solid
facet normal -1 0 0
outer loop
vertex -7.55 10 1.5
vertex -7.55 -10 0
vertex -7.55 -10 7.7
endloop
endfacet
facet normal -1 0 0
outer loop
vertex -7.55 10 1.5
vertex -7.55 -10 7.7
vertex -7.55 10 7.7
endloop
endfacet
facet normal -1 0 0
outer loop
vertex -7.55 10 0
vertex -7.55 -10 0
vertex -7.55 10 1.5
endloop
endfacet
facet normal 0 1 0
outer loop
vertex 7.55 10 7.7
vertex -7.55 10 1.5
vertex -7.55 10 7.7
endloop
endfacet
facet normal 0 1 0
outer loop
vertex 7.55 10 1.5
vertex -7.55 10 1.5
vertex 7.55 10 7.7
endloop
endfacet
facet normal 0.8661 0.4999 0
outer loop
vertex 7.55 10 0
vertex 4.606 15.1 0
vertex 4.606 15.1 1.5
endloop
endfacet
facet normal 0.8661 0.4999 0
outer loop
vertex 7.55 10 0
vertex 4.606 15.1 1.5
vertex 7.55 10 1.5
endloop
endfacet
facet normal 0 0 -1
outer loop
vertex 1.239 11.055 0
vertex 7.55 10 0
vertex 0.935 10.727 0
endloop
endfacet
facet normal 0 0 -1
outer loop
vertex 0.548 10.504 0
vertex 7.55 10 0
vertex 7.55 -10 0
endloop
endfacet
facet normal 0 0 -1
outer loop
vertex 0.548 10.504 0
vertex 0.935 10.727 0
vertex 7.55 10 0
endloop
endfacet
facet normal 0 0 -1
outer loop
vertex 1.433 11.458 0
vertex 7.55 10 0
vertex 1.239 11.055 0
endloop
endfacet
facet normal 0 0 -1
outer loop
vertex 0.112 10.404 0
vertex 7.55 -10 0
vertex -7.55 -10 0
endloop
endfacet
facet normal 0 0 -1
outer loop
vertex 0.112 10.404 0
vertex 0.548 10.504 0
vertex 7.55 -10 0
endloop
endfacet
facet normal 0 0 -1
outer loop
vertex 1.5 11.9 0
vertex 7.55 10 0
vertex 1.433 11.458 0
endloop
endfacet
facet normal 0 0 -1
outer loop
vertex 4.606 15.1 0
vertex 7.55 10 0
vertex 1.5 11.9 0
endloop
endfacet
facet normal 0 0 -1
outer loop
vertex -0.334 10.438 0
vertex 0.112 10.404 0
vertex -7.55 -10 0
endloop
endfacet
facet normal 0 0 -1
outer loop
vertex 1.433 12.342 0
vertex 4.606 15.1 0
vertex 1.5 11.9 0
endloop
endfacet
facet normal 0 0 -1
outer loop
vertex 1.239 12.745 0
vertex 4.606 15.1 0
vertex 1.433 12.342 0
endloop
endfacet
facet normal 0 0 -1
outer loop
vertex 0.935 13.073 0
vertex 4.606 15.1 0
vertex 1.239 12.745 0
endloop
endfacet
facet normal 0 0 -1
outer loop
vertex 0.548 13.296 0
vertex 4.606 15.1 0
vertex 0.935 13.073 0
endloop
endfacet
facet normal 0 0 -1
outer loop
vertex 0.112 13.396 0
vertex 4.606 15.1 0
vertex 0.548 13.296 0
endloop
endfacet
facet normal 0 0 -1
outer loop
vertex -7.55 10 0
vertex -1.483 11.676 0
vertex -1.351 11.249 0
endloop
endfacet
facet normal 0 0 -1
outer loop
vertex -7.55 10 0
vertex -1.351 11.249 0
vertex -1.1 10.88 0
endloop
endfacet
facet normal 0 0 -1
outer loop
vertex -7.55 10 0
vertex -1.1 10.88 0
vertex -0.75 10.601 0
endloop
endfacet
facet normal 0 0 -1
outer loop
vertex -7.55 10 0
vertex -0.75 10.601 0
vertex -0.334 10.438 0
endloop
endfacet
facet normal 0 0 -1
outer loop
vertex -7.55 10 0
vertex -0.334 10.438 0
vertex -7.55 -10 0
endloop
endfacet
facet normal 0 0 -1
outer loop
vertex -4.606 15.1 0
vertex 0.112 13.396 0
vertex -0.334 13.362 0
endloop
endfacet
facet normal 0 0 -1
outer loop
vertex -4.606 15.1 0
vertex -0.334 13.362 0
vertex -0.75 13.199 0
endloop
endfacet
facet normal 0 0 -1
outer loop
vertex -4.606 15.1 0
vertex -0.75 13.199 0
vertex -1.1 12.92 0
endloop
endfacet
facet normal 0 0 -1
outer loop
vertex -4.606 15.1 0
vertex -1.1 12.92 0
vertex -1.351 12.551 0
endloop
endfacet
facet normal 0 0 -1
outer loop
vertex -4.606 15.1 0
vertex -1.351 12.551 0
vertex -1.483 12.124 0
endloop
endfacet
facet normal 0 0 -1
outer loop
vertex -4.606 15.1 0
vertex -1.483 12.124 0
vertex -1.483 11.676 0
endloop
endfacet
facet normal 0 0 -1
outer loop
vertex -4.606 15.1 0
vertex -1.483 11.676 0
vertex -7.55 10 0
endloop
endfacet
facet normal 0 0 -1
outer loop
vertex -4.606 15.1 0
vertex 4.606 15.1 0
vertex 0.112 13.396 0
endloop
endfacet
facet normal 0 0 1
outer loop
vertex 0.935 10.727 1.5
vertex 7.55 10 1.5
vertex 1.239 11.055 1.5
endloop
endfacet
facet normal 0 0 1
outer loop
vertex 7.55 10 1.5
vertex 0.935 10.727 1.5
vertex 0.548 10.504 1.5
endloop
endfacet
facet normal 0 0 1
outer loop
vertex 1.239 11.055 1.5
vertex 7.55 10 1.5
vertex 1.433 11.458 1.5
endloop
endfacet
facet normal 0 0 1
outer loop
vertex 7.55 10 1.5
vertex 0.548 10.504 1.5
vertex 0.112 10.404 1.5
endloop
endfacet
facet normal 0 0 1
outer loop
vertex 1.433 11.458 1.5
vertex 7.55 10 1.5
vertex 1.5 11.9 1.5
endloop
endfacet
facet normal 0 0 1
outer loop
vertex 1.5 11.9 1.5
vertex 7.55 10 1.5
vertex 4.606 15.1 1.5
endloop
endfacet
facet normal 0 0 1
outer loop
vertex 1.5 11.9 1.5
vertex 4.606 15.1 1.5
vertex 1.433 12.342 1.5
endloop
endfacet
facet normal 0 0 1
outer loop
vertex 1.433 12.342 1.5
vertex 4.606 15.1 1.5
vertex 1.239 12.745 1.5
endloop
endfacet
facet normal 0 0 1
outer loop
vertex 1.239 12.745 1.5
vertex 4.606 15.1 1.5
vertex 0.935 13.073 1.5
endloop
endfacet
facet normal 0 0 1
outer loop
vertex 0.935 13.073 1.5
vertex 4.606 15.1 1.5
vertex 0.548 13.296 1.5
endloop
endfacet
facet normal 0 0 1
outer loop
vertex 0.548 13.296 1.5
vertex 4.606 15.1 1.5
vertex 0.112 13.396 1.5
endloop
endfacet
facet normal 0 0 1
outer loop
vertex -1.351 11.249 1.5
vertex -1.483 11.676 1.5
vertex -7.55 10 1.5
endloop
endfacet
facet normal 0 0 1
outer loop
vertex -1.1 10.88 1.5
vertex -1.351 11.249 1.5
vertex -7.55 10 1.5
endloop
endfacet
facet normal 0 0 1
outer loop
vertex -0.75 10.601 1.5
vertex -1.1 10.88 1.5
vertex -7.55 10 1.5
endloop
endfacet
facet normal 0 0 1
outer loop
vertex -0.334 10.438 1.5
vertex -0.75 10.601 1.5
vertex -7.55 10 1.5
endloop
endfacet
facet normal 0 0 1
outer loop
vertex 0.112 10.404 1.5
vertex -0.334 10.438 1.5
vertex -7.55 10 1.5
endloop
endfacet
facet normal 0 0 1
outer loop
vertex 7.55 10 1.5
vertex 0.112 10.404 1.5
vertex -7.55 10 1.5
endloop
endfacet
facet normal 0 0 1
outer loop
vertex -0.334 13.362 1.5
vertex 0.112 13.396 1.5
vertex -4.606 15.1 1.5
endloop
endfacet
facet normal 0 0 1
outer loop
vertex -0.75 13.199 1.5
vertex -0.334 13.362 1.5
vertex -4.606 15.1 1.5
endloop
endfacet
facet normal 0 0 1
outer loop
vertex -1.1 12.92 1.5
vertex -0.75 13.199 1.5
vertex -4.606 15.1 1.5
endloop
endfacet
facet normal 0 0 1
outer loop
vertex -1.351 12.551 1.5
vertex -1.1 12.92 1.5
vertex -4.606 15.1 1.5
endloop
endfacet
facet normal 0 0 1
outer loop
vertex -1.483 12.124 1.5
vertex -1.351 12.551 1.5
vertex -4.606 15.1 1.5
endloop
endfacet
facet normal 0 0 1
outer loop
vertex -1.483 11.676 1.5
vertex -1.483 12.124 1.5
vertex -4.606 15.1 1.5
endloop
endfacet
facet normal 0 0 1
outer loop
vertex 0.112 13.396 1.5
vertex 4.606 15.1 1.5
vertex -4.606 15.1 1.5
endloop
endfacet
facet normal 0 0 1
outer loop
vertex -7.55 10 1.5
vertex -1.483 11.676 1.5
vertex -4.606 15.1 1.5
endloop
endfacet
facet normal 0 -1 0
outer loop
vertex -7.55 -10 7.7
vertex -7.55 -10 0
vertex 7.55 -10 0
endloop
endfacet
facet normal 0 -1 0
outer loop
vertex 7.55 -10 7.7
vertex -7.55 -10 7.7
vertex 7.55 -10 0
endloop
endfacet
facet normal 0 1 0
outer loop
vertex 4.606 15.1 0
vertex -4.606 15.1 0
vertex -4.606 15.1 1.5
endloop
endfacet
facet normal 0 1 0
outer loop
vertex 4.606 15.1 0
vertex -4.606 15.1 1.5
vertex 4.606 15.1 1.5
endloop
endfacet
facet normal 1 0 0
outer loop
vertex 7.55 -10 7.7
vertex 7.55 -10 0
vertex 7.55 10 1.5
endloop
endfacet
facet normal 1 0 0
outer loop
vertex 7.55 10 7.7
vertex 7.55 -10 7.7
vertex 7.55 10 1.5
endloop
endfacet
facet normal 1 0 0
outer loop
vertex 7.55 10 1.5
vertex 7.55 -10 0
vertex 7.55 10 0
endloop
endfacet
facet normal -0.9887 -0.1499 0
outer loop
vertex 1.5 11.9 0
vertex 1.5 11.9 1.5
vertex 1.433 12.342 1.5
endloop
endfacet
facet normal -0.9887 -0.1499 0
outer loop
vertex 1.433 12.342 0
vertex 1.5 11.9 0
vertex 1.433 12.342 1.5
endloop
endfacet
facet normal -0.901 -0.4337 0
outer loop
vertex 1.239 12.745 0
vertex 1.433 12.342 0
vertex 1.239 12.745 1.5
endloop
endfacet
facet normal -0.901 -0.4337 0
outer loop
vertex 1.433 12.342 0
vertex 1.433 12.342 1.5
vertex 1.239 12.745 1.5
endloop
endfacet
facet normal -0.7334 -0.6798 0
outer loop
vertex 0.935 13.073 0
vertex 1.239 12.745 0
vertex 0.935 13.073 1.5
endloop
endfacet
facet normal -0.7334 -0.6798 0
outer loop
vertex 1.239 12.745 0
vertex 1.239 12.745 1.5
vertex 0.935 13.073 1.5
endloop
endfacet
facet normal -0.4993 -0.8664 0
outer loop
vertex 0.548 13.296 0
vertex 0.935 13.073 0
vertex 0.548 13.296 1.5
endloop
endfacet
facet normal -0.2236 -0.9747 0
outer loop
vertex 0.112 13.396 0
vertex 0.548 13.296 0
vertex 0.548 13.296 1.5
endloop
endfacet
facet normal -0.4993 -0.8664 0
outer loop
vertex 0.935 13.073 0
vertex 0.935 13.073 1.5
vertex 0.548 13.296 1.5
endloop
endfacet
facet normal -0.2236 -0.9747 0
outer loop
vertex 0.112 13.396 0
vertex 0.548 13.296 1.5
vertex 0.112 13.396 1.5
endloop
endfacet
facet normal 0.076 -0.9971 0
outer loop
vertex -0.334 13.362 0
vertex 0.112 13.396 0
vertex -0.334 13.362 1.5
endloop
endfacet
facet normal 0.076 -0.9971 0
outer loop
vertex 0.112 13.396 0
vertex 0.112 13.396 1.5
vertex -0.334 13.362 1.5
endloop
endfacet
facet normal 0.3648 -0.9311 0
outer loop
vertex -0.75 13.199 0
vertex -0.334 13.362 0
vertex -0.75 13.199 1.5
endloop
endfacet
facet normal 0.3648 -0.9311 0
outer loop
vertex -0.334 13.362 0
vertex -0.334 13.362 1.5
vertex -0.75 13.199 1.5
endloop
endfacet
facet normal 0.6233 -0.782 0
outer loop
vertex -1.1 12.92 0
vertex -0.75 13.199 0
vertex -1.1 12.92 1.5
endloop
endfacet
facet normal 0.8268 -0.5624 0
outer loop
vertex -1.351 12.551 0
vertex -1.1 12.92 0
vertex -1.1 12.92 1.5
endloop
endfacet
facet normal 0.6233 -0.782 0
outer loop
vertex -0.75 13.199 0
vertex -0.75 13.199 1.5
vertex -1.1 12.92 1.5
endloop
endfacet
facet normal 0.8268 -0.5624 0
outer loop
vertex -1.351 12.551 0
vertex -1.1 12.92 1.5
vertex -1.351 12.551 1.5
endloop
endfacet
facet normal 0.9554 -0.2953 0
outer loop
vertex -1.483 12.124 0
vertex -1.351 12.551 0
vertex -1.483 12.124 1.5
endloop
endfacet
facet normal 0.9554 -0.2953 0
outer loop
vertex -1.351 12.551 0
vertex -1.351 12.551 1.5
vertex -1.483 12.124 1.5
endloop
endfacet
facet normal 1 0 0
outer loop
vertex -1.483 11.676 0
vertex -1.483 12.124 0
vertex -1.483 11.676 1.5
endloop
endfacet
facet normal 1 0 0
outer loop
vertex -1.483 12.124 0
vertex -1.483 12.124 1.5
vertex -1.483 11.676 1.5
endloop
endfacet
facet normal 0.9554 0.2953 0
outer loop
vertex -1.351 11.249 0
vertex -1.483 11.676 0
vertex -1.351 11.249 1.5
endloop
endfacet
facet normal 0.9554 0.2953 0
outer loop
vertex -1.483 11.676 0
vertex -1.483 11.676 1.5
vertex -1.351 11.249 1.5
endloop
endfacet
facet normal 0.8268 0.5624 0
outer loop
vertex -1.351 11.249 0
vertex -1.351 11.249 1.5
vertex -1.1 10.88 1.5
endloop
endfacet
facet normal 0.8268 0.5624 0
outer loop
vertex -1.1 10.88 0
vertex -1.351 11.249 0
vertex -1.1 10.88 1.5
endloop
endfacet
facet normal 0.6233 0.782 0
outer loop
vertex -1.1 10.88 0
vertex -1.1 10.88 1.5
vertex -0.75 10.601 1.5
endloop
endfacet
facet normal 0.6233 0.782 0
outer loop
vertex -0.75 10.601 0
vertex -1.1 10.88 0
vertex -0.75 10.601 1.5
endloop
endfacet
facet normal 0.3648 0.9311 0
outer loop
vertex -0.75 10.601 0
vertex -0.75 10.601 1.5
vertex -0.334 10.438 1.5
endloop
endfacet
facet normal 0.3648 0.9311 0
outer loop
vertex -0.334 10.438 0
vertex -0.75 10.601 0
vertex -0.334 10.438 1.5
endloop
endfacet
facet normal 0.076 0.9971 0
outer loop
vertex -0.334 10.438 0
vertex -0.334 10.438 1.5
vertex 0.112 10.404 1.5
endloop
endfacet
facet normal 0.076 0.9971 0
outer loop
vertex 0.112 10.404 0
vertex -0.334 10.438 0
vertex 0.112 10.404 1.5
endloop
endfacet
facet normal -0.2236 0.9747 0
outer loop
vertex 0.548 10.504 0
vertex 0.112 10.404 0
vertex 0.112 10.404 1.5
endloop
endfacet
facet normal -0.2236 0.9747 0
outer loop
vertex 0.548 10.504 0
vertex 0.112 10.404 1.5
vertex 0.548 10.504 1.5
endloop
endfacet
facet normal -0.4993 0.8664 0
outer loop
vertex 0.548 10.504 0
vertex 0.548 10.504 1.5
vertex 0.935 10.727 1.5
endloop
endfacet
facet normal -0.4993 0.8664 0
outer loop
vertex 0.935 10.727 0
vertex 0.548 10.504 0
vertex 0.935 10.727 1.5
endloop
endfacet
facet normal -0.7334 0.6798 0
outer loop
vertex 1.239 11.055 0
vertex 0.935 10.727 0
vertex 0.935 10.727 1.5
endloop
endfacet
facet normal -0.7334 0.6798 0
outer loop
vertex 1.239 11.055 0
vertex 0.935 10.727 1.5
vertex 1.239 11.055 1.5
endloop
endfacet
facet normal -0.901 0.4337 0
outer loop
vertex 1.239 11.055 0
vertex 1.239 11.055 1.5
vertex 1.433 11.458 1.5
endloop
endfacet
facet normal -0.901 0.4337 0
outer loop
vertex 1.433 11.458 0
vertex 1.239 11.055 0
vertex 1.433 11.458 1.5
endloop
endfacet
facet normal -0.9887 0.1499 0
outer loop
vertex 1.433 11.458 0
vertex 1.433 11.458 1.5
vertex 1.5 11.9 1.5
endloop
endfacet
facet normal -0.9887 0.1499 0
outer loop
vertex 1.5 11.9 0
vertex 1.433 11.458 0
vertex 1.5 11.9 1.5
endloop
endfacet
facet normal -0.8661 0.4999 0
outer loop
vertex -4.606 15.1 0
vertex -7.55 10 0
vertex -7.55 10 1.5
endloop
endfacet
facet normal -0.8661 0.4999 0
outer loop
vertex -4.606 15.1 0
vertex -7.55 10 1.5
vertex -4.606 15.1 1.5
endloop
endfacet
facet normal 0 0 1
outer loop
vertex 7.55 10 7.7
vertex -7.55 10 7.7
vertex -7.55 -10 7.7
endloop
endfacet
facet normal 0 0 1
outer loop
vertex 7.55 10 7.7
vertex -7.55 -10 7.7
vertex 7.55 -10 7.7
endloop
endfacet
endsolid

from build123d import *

# Parameters (mm, degrees)
SKETCH1_W           = 15.1
SKETCH1_H           = 20
BOSS_EXTRUDE1_DEPTH = 7.7
BOSS_EXTRUDE2_DEPTH = 1.5
SKETCH4_R           = 1.5
CUT_EXTRUDE1_DEPTH  = 18.984785236


with BuildPart() as part:
    # Sketch1 → Boss-Extrude1 (new body)
    with BuildSketch(Plane.XY):
        Rectangle(SKETCH1_W, SKETCH1_H)
    extrude(amount=BOSS_EXTRUDE1_DEPTH)

    # Sketch3 → Boss-Extrude2 (add)
    with BuildSketch(Plane(origin=(0, 0, 0), x_dir=(-1, 0, 0), z_dir=(0, 0, -1))):
        Polygon((4.605513627, 15.1), (-4.605513627, 15.1), (-7.55, 10), (7.55, 10), align=None)
    extrude(amount=-BOSS_EXTRUDE2_DEPTH)

    # Sketch4 → Cut-Extrude1 (cut, through all)
    with BuildSketch(Plane.XY.offset(1.5)):
        with Locations((0, 11.9)):
            Circle(SKETCH4_R)
    extrude(amount=-CUT_EXTRUDE1_DEPTH, mode=Mode.SUBTRACT)


solid = part.part
